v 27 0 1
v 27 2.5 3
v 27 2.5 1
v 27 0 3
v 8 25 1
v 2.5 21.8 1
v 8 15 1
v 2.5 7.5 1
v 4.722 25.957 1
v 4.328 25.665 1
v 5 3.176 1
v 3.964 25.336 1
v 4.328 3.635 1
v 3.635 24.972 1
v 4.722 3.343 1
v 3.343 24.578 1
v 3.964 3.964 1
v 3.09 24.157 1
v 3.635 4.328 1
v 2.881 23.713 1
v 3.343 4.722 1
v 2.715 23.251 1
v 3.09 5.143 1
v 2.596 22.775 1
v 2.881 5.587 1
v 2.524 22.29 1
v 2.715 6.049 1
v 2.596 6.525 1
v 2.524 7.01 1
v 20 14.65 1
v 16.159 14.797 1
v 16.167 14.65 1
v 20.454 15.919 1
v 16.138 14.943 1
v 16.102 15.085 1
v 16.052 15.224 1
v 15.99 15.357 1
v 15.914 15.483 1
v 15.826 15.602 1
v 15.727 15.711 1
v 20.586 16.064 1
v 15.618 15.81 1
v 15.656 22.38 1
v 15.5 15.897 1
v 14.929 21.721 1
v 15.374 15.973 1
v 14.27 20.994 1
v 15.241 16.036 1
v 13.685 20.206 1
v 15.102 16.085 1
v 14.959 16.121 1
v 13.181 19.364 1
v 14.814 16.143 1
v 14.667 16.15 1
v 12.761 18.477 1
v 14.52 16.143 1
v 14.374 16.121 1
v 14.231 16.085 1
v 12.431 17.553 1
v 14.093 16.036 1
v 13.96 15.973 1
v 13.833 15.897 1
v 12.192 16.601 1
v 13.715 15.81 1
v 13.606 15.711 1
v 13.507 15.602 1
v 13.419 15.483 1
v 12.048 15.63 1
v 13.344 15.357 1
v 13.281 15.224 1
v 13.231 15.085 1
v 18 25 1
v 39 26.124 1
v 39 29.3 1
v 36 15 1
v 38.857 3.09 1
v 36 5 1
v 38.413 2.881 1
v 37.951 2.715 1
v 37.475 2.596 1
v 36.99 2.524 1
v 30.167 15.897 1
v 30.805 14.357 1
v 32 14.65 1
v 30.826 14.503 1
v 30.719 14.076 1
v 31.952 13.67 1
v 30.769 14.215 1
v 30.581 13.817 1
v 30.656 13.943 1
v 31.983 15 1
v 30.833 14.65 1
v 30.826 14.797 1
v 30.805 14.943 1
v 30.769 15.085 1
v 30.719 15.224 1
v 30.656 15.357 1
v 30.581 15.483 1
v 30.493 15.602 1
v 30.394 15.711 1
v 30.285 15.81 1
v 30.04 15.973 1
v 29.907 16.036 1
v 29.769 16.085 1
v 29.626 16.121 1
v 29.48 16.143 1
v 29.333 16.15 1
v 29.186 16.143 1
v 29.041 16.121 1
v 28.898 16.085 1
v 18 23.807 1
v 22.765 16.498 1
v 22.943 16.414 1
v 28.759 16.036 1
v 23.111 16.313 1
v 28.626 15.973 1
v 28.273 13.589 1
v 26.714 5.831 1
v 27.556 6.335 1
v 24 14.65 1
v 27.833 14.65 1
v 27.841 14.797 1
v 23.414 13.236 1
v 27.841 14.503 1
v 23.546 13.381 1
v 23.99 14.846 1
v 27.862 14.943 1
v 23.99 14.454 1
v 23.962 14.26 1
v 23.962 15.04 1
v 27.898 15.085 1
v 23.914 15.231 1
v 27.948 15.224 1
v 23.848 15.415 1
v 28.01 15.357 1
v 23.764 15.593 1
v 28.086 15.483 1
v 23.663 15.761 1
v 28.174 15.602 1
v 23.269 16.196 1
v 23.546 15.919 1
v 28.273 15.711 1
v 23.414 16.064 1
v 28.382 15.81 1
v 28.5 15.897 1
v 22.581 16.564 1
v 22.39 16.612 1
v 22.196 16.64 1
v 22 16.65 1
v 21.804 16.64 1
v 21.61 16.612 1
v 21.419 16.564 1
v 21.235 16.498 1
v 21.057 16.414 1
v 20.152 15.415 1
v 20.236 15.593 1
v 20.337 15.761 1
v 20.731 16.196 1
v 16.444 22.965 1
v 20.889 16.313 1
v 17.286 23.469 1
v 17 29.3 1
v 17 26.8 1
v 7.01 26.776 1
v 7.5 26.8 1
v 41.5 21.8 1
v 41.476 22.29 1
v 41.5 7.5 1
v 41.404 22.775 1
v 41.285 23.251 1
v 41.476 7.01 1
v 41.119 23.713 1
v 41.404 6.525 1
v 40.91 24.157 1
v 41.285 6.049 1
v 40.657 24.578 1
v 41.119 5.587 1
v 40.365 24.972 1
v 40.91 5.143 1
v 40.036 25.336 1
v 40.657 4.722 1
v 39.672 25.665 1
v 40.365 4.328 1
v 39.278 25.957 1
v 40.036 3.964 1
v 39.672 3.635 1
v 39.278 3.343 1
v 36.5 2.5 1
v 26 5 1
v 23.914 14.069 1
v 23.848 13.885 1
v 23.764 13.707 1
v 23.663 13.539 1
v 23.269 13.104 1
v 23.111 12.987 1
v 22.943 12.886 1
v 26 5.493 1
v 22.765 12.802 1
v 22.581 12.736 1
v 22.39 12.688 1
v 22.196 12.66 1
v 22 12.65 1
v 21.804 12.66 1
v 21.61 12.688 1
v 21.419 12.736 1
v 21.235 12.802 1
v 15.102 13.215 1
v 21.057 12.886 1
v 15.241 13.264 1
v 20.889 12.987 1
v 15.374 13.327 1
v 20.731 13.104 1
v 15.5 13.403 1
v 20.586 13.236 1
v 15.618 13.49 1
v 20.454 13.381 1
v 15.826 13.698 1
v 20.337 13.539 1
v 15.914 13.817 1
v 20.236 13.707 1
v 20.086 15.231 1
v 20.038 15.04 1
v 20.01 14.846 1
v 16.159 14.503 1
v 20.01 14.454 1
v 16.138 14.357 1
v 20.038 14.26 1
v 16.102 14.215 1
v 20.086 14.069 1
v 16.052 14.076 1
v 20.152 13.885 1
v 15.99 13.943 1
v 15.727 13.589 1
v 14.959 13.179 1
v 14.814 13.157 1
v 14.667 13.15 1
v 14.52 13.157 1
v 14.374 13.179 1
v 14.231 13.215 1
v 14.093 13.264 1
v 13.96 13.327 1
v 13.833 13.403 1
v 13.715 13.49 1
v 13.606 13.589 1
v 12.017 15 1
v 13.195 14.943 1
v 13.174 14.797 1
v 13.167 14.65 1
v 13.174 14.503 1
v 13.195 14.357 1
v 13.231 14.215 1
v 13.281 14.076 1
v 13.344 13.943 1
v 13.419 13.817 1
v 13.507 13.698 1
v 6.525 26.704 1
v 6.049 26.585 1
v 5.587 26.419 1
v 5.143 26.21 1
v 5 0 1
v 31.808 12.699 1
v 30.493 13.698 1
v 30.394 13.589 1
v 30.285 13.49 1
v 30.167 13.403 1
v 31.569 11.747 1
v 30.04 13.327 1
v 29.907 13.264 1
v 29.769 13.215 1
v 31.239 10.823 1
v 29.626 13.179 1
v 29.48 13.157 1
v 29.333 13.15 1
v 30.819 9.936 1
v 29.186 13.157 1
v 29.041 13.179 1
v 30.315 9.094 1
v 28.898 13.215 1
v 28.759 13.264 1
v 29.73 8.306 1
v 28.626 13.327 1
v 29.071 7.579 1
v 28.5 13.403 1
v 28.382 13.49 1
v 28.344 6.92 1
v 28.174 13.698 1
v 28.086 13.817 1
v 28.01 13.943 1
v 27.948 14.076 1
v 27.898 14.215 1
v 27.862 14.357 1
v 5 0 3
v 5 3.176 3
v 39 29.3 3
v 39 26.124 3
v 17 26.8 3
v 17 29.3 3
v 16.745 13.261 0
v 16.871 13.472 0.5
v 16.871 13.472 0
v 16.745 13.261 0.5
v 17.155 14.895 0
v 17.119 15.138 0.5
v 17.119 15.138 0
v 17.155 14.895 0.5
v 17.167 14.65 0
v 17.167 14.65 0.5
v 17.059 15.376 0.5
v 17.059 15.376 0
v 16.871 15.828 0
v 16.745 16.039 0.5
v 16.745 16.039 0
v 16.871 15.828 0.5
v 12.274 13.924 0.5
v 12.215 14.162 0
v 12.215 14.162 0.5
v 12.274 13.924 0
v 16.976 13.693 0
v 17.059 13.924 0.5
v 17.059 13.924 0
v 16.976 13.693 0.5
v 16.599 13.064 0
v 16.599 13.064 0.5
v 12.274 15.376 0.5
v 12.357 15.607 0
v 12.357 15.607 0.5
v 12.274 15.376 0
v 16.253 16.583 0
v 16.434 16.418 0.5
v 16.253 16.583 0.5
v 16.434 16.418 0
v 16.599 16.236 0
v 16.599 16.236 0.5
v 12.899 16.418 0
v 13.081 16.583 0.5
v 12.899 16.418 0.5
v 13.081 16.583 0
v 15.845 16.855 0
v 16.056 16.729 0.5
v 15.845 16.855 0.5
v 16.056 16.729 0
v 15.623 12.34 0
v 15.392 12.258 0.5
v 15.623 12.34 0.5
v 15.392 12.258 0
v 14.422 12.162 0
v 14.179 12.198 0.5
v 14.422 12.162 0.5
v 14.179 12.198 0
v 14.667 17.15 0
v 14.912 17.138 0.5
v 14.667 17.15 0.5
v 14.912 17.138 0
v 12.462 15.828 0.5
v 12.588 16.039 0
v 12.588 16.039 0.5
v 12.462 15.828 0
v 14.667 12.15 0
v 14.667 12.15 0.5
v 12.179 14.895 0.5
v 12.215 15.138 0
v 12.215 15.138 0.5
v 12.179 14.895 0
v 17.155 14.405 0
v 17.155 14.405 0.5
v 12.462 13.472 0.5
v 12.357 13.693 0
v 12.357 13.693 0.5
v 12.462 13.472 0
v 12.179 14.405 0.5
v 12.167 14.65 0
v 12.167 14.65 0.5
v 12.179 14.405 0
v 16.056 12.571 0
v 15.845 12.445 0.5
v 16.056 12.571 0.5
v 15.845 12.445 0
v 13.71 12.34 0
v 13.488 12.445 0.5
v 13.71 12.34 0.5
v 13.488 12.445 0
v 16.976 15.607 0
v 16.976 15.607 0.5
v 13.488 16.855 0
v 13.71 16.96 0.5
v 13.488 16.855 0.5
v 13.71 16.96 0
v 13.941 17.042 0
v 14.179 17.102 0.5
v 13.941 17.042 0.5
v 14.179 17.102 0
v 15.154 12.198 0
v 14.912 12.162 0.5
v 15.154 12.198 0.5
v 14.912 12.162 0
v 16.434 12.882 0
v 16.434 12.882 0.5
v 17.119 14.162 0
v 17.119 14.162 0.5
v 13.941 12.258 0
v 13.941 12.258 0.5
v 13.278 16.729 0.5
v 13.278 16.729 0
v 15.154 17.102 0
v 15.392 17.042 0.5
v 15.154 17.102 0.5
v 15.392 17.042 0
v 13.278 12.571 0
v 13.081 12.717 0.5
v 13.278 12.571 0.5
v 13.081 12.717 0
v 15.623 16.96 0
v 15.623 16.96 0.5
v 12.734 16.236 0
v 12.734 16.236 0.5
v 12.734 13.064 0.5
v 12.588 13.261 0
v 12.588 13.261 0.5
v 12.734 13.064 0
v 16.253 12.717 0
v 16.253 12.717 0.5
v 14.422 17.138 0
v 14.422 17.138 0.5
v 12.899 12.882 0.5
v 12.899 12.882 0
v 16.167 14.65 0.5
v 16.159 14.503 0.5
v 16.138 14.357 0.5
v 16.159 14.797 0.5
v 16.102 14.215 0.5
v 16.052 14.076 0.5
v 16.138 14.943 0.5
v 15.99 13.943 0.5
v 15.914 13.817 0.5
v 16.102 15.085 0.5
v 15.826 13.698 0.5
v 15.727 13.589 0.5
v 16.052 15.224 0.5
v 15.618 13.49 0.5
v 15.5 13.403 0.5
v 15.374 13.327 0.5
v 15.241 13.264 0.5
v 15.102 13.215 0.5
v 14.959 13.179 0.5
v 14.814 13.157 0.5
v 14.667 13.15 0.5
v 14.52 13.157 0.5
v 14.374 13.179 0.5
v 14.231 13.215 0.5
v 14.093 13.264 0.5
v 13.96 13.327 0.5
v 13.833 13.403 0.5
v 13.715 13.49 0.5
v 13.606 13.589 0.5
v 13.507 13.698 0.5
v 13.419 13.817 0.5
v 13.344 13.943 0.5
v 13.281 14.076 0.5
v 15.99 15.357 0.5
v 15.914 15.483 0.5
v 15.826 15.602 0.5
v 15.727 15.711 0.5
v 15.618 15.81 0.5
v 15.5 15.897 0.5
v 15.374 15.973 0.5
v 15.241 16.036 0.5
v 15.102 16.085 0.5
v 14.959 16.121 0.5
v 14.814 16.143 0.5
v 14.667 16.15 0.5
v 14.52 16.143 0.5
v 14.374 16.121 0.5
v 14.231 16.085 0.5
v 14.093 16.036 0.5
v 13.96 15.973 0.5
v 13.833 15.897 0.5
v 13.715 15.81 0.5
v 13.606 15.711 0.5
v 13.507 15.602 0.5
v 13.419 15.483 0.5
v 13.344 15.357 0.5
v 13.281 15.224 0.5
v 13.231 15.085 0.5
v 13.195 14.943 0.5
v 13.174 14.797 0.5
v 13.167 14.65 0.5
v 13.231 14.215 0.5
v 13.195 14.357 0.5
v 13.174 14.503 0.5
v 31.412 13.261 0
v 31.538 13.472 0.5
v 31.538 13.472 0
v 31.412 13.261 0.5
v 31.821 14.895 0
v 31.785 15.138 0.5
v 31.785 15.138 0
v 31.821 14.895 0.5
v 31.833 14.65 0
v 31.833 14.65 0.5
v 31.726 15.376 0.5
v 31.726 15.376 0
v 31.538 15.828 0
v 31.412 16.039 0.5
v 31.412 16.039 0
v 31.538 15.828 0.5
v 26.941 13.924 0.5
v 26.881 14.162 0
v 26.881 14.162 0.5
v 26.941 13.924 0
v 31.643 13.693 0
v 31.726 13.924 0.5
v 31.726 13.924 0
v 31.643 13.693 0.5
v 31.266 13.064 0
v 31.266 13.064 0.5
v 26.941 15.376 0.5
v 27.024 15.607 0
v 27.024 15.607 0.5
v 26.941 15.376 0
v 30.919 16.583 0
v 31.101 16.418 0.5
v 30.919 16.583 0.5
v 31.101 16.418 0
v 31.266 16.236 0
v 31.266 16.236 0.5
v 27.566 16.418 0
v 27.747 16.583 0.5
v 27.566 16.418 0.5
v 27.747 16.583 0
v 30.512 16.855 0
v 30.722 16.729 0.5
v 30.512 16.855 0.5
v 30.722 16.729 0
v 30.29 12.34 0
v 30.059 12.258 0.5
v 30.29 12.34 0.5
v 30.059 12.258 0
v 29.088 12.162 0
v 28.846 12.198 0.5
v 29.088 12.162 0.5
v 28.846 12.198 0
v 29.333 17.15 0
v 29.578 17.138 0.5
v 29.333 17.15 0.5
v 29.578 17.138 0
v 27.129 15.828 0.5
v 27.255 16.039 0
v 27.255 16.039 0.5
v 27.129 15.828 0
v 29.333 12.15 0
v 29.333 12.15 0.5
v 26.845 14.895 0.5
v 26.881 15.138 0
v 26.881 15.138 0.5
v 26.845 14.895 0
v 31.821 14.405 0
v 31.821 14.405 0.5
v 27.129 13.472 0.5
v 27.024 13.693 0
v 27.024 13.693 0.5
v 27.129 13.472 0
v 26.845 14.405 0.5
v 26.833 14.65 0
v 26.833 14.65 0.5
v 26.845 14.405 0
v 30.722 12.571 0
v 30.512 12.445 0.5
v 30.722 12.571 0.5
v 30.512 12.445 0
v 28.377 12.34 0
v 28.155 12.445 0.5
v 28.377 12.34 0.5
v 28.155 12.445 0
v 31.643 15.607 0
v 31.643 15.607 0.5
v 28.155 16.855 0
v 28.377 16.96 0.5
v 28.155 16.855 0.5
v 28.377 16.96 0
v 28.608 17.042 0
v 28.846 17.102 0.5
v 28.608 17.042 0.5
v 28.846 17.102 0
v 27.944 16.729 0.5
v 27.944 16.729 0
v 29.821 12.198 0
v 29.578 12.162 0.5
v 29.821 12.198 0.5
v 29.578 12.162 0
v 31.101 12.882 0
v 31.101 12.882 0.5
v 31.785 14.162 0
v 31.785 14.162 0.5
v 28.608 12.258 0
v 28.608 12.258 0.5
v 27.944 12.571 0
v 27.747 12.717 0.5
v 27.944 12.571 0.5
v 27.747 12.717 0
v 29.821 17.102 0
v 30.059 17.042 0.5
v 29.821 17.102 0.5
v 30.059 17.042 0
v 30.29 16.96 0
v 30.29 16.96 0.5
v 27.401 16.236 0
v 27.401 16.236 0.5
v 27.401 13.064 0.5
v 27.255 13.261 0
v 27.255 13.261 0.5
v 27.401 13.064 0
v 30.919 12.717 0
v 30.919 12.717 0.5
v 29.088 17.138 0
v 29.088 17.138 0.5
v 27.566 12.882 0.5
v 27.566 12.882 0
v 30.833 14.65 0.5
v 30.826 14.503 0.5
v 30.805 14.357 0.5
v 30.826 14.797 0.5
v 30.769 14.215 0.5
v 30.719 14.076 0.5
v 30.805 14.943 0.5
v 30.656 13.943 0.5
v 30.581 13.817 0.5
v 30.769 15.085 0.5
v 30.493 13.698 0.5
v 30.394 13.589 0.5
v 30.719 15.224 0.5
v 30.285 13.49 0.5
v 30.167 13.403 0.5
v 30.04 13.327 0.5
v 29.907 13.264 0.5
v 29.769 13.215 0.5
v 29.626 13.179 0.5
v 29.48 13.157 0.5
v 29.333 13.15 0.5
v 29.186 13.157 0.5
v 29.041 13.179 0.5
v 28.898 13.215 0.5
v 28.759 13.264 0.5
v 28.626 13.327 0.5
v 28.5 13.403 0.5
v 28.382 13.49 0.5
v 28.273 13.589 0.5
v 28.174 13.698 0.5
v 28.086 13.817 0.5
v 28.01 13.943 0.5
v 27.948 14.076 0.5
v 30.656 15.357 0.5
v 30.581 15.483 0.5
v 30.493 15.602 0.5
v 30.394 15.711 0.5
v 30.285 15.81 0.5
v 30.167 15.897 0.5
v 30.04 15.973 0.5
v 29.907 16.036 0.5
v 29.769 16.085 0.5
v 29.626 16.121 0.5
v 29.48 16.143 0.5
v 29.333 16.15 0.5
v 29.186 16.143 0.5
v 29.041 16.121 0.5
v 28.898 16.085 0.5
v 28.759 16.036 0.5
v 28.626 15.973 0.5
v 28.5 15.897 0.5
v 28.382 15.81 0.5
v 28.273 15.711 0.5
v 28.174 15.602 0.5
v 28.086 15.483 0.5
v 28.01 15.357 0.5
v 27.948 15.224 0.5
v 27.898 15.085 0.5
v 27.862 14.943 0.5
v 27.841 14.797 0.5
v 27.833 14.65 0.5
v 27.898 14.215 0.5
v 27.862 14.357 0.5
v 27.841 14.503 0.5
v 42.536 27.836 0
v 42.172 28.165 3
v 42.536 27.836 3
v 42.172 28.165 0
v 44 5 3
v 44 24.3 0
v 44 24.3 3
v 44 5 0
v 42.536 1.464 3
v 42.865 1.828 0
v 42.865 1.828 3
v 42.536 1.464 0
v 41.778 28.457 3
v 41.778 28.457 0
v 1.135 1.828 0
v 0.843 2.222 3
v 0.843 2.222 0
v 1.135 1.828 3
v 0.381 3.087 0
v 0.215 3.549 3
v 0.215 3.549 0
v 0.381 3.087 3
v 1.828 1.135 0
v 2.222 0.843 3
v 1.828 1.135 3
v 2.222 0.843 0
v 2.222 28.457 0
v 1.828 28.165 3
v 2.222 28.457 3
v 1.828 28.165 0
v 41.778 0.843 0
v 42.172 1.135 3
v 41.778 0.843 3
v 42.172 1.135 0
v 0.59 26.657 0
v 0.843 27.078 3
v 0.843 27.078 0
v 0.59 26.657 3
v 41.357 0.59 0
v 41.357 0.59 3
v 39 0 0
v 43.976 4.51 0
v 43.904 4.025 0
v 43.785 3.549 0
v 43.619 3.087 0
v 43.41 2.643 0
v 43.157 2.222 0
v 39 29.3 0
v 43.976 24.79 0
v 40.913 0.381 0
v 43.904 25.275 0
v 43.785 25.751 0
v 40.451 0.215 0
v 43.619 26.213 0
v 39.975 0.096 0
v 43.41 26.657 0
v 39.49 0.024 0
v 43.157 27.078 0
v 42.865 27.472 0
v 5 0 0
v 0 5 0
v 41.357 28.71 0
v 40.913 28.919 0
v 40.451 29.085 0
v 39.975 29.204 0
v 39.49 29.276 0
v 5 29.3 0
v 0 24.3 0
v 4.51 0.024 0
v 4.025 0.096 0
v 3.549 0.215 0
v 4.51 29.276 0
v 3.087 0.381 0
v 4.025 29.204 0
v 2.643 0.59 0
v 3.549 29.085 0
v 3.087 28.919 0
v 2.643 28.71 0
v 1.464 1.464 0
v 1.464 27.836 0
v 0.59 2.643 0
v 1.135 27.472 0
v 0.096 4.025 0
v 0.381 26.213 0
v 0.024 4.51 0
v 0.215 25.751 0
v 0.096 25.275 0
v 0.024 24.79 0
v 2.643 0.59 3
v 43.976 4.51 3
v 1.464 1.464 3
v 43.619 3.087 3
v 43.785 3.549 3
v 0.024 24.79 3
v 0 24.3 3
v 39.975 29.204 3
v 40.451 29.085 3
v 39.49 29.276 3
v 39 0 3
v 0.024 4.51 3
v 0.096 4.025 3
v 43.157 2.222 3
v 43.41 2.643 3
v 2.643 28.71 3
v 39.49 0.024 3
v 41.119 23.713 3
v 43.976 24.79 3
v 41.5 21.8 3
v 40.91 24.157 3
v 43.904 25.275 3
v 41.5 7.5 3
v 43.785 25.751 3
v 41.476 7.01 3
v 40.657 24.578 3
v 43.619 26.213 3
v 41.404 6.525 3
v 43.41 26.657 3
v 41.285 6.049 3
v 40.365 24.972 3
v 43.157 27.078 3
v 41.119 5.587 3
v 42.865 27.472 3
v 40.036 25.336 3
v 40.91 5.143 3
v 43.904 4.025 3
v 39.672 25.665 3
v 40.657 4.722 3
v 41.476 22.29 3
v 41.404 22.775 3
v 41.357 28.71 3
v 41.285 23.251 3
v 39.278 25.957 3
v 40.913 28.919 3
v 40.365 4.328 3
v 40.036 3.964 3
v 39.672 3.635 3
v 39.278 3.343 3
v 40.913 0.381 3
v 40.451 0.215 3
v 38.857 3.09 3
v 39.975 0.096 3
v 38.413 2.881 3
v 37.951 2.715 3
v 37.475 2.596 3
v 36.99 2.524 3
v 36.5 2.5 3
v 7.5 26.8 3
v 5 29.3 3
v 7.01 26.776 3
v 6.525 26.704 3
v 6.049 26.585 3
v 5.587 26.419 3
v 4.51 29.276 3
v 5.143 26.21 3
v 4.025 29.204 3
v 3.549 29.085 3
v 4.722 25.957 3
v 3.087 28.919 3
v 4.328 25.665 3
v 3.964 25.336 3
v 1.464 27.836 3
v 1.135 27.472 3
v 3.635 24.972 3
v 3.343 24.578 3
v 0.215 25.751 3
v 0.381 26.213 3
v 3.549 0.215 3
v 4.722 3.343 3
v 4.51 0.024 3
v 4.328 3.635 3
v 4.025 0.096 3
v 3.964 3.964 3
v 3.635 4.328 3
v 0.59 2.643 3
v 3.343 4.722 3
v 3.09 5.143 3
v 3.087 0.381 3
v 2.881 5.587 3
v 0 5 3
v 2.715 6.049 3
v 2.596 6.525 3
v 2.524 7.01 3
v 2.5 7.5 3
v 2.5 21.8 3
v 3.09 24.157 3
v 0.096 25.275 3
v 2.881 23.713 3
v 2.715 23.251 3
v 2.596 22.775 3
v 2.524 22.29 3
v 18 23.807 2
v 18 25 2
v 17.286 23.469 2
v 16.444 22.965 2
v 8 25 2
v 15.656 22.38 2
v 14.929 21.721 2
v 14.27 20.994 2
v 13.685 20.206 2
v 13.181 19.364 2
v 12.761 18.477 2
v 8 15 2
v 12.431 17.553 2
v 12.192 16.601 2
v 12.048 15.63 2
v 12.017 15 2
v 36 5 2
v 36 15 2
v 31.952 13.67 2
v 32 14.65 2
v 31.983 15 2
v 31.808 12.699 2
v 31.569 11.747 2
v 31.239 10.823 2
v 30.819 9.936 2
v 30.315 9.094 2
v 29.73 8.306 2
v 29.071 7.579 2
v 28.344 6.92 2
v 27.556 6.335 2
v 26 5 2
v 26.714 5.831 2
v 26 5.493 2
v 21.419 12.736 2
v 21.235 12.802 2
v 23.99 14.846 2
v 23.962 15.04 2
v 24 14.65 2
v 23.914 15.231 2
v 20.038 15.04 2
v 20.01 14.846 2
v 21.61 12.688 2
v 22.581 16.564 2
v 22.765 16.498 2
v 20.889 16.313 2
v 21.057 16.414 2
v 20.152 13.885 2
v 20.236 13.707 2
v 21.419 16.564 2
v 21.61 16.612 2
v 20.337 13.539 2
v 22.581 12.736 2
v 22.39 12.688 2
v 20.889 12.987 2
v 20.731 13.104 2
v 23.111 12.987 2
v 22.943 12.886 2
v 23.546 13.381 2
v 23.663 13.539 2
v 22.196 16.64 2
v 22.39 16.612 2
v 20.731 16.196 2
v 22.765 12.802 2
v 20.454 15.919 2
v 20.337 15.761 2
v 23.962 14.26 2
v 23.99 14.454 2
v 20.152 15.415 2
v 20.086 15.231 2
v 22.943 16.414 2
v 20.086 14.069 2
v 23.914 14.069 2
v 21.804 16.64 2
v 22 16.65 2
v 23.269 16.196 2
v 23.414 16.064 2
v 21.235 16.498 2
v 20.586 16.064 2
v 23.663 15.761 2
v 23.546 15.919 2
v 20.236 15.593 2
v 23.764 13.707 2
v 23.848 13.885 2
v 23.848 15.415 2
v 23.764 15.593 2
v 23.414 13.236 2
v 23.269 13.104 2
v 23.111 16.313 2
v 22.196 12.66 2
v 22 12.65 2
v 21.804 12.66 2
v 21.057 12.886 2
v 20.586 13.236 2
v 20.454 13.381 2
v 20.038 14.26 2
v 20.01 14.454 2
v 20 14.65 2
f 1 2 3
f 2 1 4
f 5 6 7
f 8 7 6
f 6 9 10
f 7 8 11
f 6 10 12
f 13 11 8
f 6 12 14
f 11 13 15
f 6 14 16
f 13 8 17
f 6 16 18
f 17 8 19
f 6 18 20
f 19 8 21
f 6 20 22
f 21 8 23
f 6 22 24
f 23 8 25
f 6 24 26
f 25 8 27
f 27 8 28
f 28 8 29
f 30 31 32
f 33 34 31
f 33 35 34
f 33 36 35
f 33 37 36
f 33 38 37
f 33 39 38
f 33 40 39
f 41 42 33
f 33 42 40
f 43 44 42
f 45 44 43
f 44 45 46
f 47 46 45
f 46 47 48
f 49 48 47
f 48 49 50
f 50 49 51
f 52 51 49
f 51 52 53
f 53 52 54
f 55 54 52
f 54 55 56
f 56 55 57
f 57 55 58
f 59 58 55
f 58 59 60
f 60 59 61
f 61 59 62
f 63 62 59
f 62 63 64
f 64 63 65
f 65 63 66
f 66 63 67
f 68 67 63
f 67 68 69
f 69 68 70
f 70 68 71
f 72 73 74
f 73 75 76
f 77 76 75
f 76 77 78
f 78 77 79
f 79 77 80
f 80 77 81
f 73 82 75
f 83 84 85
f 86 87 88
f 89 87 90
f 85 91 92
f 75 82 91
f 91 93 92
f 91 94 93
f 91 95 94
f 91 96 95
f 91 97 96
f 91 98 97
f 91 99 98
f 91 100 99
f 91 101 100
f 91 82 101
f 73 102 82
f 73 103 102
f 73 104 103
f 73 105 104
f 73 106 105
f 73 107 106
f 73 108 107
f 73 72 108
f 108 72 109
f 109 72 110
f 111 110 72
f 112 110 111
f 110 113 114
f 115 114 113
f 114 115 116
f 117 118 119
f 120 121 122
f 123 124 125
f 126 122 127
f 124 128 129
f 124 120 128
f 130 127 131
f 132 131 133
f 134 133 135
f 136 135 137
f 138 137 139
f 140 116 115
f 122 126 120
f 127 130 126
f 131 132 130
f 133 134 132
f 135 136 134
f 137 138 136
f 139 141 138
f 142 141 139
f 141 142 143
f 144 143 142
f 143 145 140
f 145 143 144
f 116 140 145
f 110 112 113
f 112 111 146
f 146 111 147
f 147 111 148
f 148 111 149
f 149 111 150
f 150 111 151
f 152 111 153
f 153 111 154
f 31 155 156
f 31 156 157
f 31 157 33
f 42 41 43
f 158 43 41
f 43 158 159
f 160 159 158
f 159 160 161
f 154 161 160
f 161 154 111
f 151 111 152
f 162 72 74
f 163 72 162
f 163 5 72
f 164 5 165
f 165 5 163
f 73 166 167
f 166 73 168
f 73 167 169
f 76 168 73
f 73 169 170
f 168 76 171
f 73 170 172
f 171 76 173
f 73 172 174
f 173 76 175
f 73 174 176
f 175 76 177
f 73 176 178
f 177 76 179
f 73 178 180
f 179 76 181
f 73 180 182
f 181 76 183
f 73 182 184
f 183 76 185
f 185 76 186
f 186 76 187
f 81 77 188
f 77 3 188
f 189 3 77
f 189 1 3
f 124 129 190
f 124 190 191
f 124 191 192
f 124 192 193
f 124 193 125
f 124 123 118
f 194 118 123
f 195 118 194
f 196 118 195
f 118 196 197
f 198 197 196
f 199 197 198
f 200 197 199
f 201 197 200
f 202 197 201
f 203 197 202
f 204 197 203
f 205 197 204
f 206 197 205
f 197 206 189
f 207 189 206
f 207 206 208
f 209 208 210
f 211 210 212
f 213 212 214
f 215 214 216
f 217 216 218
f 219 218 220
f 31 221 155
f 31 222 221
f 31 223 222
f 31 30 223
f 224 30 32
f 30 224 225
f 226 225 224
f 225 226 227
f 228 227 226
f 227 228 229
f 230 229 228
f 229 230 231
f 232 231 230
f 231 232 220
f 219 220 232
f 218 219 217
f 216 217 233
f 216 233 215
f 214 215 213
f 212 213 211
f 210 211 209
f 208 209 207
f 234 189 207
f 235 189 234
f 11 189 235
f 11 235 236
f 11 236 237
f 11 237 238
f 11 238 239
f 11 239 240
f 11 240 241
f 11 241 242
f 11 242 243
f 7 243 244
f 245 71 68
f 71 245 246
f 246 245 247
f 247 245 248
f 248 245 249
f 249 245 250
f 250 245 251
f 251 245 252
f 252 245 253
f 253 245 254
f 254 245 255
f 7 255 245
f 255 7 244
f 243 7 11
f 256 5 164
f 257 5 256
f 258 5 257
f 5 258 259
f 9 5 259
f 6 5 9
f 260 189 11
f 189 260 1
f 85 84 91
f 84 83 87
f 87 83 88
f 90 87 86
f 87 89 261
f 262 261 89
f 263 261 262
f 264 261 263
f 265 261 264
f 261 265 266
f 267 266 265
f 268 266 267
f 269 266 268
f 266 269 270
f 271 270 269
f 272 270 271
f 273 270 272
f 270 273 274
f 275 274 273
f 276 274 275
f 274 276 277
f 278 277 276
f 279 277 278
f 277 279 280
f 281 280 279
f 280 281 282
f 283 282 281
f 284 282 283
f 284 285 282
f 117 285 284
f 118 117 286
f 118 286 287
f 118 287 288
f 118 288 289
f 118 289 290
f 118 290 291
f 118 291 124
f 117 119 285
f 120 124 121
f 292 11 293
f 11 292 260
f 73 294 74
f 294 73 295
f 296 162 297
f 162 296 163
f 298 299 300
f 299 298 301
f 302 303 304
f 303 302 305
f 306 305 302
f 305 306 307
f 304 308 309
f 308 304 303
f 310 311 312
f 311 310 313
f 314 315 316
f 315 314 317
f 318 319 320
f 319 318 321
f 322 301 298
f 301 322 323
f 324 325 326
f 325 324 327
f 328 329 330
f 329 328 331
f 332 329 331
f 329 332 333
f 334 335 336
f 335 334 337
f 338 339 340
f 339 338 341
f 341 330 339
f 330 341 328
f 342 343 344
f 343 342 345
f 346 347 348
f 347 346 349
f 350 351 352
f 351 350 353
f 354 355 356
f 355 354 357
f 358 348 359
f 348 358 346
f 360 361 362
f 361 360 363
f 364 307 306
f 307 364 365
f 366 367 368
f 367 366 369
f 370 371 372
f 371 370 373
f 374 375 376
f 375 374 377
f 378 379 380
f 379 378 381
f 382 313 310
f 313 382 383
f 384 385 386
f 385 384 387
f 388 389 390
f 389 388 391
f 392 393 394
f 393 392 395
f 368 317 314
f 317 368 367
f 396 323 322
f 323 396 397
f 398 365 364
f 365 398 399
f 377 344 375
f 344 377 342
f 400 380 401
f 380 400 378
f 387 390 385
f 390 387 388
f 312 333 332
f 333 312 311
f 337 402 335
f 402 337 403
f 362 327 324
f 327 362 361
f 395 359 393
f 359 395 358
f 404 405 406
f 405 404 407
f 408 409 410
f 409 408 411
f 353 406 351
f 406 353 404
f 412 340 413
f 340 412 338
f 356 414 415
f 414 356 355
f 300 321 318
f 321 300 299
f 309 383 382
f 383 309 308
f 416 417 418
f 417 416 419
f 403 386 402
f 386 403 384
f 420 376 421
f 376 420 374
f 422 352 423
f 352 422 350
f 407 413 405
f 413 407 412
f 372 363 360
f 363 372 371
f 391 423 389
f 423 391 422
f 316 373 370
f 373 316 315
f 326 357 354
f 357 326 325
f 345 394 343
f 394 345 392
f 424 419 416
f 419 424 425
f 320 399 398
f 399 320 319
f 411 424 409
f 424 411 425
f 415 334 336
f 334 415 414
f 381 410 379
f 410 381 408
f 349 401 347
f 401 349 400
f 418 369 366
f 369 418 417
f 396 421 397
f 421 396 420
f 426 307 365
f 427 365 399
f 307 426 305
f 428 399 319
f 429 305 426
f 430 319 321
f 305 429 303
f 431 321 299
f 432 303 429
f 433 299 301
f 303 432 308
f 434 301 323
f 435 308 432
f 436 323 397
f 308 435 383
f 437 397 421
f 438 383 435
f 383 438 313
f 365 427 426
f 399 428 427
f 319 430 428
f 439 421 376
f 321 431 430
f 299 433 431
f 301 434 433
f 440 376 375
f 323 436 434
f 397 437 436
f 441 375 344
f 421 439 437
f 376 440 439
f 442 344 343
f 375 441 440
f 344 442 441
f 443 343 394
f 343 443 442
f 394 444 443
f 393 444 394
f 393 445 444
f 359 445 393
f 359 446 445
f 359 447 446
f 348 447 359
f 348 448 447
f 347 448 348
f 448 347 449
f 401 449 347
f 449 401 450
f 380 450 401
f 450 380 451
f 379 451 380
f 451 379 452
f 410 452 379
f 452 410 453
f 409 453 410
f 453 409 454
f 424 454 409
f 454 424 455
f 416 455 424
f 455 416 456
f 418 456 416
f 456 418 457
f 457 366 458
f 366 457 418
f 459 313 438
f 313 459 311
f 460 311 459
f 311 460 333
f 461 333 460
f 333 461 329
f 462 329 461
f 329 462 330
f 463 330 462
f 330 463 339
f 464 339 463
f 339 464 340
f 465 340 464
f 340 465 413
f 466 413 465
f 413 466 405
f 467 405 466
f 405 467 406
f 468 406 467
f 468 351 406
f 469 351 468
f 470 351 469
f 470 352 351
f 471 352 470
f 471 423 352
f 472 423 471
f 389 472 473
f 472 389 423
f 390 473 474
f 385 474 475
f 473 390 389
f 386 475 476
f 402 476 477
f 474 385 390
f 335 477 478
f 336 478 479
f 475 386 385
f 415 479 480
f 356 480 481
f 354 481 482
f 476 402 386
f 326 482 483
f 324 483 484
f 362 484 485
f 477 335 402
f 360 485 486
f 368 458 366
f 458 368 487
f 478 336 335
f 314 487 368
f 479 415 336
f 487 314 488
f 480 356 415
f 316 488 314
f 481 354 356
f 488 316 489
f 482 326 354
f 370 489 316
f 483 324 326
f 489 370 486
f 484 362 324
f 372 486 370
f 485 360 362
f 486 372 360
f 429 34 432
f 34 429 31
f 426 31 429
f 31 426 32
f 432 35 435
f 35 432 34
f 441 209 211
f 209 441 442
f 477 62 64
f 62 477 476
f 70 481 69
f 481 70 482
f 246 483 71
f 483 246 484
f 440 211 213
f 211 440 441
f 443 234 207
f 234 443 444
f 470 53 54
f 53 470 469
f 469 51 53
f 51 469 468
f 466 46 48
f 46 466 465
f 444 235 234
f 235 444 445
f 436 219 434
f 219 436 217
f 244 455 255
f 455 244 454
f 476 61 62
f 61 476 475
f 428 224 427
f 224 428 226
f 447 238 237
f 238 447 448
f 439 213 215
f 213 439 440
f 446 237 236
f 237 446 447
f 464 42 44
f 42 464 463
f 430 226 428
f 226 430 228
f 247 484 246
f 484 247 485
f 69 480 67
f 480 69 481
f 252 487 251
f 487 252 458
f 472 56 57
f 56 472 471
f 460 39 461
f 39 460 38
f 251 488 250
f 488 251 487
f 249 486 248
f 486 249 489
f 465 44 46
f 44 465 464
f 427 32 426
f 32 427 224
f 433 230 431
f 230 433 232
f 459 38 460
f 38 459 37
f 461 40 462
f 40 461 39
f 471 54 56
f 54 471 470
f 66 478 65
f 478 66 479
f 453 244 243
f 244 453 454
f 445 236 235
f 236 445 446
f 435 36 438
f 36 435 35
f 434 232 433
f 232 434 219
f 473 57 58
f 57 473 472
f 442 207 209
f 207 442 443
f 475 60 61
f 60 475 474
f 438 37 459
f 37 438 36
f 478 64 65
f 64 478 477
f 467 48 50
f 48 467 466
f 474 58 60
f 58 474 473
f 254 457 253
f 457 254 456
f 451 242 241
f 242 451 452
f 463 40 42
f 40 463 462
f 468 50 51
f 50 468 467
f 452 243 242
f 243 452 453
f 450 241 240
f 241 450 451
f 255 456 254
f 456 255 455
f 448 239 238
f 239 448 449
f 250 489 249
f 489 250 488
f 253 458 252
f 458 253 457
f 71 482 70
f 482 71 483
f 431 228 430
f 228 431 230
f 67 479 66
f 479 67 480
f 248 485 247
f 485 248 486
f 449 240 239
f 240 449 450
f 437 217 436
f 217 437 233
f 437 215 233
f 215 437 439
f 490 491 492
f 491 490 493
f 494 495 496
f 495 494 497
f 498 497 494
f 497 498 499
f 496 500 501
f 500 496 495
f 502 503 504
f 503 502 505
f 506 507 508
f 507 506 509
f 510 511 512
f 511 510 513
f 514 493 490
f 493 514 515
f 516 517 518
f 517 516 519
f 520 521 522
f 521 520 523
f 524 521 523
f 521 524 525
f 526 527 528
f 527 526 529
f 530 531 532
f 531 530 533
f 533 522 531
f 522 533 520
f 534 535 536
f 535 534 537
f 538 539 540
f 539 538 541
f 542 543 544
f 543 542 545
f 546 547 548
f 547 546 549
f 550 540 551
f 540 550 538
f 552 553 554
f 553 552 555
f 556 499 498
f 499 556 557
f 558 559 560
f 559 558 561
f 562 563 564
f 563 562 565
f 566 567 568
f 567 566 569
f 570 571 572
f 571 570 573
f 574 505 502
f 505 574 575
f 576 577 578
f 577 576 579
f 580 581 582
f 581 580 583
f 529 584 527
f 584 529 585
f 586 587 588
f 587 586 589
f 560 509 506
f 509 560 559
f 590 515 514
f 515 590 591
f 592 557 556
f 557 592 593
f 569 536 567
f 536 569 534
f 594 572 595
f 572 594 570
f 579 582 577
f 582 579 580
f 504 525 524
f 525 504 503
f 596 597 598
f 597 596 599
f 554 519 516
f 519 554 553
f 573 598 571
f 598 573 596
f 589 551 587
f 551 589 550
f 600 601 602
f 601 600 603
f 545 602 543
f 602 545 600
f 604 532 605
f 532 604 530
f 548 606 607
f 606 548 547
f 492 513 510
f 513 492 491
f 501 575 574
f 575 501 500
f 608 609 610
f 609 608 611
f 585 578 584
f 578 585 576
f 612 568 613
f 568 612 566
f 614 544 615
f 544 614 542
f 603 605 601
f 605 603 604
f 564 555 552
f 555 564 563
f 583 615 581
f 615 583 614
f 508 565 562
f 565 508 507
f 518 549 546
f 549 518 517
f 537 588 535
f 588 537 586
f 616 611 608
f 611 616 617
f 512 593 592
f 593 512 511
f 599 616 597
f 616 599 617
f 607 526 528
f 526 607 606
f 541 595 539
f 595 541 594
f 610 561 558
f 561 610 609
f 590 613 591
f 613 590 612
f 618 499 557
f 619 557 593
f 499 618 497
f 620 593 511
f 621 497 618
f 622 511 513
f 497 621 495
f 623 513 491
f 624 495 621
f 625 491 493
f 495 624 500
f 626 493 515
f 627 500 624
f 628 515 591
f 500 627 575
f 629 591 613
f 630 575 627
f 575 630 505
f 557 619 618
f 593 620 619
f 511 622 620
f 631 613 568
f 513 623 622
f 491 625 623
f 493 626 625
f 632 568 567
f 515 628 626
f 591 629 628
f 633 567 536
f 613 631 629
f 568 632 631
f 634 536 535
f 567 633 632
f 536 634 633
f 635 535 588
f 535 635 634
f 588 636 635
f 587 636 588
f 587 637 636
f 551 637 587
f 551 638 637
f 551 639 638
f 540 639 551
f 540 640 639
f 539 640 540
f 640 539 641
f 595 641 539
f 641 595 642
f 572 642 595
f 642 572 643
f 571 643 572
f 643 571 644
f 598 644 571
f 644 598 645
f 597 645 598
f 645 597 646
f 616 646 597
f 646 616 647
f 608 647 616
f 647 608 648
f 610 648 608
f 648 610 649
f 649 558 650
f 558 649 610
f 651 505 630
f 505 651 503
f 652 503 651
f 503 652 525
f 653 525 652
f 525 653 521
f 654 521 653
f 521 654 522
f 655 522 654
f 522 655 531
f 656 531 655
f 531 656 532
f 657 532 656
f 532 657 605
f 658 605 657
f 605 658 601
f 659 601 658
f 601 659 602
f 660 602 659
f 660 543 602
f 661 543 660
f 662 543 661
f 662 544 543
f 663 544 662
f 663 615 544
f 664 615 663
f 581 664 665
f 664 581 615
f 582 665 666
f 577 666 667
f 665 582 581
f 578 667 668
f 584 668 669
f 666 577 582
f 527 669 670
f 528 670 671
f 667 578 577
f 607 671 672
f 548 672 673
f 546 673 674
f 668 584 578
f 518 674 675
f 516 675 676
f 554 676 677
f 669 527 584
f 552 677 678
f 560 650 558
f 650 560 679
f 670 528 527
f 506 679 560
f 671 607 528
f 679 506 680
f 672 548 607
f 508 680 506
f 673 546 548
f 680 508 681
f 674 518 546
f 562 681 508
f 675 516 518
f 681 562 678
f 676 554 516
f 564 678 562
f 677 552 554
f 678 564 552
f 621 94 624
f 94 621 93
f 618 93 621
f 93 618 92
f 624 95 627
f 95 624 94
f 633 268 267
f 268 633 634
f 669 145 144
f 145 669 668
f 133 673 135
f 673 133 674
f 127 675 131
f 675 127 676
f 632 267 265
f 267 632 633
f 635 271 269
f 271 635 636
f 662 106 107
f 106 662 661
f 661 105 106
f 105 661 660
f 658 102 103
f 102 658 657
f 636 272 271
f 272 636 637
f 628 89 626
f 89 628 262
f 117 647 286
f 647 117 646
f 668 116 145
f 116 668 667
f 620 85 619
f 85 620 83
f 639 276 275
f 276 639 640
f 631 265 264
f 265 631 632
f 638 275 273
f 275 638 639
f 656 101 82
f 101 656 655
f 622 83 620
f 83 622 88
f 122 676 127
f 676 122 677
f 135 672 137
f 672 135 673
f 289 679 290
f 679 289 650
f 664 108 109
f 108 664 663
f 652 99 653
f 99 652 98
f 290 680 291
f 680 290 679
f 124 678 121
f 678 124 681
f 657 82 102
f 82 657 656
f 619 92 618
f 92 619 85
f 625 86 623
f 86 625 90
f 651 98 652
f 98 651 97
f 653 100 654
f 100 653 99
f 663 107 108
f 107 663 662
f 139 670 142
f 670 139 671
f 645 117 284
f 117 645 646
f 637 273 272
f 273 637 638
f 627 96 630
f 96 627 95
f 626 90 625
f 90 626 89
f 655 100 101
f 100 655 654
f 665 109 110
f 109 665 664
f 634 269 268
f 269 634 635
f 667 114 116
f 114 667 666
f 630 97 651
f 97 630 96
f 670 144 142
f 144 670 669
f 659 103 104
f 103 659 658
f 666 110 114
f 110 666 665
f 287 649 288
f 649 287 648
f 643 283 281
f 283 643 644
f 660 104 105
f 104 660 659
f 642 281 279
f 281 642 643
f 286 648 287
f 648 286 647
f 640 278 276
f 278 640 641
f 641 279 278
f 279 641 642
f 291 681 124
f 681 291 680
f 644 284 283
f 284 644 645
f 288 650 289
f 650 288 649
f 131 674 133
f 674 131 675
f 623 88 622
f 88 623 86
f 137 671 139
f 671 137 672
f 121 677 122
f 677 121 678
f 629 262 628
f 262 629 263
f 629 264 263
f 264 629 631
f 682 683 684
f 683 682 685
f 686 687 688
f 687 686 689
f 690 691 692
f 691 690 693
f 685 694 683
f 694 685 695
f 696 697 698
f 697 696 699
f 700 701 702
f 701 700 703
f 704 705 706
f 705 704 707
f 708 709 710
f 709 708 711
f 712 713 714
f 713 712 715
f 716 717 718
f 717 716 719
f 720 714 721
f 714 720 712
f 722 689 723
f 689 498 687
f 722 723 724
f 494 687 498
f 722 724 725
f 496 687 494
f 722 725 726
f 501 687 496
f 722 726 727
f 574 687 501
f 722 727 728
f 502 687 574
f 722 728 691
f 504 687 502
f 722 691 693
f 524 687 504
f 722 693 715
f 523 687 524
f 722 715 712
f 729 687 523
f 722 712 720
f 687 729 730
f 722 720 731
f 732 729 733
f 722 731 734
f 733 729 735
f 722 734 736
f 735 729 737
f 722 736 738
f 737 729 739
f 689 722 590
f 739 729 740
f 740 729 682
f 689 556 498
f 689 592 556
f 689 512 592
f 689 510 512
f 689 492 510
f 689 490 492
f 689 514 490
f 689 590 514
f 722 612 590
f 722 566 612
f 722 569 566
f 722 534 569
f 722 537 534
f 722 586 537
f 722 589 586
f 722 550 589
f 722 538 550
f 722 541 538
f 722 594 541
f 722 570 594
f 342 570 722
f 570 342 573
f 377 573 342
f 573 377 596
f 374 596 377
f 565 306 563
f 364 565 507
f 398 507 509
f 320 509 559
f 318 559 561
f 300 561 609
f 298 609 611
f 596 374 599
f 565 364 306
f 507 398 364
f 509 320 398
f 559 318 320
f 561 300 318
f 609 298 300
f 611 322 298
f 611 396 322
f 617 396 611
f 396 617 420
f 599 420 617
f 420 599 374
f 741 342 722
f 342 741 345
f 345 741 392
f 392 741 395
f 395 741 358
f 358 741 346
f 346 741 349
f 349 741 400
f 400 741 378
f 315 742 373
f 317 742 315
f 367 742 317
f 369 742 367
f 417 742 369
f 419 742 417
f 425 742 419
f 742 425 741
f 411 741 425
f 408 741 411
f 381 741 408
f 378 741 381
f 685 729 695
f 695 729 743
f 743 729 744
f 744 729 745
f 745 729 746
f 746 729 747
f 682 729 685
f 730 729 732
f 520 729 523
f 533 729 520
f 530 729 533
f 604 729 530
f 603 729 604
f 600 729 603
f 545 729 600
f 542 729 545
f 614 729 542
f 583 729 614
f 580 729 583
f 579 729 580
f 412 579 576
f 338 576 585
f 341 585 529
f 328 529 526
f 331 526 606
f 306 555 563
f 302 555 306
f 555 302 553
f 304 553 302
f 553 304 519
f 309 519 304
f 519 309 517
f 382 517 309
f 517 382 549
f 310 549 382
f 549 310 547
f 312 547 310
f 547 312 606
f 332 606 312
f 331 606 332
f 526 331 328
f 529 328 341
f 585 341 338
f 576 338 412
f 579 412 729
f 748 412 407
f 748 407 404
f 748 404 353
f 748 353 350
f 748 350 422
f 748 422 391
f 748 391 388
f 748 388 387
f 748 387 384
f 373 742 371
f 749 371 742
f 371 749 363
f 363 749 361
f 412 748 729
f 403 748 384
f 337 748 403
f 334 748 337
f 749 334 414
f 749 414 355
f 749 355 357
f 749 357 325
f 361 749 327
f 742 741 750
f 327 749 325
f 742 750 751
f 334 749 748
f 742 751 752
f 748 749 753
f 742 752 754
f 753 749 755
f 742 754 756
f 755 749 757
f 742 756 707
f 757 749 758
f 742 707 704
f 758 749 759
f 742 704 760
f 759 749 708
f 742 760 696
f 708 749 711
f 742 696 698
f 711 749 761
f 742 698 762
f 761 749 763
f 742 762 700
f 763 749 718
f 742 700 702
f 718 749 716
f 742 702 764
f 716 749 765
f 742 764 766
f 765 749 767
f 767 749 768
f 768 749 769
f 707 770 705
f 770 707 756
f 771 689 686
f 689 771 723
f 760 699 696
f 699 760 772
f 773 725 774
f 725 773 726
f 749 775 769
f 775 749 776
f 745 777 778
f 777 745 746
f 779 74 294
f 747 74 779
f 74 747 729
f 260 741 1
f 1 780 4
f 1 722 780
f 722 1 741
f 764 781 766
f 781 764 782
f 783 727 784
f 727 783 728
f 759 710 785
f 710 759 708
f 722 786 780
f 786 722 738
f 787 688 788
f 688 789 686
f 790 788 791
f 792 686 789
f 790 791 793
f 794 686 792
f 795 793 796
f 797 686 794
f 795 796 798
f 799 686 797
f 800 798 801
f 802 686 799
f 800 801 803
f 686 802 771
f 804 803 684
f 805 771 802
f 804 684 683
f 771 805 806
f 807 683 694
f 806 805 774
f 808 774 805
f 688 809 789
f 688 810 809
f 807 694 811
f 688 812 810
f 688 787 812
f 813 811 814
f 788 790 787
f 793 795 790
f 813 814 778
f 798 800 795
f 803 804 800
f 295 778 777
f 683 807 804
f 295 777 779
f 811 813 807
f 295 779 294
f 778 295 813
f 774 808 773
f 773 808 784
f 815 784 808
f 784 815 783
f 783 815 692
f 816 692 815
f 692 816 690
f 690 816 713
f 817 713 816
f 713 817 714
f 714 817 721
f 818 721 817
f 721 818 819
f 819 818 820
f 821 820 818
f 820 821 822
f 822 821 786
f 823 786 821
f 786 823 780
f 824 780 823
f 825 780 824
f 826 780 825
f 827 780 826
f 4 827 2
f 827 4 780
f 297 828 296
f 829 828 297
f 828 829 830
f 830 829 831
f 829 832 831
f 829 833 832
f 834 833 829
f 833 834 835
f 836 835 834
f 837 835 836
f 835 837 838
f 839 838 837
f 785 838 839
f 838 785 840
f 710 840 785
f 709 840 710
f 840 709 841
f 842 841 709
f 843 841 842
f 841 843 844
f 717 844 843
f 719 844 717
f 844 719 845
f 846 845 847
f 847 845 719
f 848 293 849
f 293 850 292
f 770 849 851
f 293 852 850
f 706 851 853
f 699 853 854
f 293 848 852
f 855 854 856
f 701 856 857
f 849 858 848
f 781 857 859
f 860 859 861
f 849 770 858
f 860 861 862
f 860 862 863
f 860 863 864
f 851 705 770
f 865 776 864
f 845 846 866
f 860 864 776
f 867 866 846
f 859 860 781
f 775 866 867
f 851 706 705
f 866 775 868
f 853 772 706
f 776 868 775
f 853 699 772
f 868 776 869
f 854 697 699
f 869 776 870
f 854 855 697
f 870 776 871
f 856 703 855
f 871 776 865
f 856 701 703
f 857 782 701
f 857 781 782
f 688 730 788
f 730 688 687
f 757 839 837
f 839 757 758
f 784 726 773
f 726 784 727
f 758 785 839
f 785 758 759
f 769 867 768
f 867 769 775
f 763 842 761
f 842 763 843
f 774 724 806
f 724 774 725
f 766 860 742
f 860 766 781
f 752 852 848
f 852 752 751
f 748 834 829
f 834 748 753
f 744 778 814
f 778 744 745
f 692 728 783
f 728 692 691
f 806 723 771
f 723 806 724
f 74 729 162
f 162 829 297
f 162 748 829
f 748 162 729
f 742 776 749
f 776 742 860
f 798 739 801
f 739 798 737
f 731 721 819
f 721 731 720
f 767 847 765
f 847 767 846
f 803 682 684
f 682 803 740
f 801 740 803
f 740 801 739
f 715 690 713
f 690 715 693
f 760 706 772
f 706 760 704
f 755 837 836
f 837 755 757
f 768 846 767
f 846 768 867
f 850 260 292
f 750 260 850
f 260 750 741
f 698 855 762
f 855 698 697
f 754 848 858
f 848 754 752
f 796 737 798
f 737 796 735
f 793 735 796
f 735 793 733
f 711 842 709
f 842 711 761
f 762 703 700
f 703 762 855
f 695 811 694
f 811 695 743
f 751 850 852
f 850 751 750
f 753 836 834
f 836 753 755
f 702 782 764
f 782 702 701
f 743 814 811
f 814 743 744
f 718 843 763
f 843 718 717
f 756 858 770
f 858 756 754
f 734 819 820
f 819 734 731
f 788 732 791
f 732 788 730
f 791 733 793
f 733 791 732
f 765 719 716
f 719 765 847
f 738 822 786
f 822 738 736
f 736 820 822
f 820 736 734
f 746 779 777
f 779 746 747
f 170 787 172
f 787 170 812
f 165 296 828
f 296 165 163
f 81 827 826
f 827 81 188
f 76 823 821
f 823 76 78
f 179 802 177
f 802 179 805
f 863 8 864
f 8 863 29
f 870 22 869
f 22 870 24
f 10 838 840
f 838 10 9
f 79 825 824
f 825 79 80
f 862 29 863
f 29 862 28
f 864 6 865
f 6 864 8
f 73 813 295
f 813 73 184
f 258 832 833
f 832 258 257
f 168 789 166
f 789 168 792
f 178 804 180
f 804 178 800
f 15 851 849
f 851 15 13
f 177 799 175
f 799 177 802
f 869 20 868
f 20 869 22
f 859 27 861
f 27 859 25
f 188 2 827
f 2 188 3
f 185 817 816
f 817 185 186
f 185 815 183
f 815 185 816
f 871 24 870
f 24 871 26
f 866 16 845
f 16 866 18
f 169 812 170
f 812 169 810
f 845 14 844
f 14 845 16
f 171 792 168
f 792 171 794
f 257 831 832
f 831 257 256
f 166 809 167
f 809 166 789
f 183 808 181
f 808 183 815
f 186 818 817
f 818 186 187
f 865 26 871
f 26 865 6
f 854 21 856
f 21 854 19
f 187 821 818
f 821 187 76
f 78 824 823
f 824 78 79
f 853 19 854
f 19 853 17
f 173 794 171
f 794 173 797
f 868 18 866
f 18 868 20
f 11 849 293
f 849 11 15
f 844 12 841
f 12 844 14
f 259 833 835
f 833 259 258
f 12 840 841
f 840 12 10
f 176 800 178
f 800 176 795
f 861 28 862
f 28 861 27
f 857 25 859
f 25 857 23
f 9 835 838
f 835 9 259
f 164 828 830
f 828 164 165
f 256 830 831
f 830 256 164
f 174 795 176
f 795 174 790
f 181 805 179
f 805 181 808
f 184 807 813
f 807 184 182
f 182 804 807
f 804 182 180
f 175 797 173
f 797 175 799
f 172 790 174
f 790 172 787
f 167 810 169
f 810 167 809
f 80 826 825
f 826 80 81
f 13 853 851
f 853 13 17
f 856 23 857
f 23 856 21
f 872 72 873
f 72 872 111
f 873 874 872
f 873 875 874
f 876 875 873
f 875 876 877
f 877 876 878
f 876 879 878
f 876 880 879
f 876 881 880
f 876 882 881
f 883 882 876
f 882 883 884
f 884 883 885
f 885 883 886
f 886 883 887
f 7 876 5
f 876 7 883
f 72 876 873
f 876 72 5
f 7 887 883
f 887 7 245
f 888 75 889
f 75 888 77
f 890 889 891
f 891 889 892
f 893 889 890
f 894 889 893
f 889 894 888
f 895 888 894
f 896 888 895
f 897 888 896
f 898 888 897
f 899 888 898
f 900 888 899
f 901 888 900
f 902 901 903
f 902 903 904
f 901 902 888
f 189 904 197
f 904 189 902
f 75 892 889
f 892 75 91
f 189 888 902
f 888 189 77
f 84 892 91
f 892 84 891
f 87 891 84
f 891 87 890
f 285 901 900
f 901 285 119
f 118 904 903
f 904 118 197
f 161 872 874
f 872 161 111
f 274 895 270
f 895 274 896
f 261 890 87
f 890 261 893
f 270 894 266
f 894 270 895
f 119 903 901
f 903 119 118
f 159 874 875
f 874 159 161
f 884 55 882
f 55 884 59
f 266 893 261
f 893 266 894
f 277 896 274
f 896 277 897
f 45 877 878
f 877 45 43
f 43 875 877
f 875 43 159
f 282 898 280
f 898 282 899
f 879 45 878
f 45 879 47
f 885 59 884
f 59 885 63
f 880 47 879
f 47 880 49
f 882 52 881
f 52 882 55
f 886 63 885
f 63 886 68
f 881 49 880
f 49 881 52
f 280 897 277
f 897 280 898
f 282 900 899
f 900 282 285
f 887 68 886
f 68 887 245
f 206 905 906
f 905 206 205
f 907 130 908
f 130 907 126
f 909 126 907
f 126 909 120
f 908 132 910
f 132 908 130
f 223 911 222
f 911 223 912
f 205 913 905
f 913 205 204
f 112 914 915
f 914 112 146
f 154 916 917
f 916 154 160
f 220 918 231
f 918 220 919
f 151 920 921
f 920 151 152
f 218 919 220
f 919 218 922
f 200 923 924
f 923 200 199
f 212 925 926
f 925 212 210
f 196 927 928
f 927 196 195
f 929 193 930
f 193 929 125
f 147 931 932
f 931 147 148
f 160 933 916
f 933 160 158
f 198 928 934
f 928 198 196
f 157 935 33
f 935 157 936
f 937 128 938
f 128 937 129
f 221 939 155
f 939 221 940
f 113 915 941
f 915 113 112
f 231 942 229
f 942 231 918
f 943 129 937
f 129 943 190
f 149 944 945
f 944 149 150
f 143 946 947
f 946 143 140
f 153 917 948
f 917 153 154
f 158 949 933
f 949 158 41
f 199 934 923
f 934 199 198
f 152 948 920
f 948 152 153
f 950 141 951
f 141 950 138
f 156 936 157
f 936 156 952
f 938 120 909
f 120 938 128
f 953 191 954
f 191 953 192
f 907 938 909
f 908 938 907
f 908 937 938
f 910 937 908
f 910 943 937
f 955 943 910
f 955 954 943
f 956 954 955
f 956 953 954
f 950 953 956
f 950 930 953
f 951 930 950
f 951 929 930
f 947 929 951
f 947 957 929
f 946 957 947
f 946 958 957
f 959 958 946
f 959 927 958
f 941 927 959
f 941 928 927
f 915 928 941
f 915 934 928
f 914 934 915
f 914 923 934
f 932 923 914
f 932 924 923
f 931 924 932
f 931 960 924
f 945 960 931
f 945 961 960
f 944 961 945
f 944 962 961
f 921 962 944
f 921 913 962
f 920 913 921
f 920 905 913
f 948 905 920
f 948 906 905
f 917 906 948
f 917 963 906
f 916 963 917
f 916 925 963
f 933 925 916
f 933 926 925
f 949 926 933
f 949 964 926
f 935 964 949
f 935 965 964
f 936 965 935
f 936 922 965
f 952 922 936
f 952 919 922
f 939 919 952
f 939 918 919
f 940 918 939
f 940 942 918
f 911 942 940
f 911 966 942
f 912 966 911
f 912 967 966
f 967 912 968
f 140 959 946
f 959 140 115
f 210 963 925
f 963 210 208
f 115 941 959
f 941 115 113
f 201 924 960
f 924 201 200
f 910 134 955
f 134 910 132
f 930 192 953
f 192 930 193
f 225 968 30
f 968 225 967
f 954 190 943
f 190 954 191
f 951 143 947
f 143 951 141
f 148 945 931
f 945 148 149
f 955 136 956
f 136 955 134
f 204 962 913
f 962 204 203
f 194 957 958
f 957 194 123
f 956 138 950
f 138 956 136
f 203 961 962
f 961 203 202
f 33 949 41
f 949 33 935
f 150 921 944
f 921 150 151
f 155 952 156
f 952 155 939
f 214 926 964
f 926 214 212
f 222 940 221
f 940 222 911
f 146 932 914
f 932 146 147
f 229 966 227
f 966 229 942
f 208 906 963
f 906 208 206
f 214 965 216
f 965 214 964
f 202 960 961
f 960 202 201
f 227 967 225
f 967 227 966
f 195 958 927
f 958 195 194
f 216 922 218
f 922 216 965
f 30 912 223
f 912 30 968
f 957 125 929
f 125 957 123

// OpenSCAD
$fn=64;
corner_radius=5;
height=3;
plate_height=1;
plate_length=44;
plate_width=29.3;
wall_thickness=5;

pillar_radius=2;
pillar_hole_radius=1.5;
pillar_mount_radius=2.5;
pillar_mount_height=0.5;

rotator_mount_diameter=20;
rotator_mount_thickness=1;
rotator_mount_height=1;

translate([corner_radius,corner_radius,0]) difference() {
    minkowski() {
        cube([plate_length-2 * corner_radius, plate_width-2 * corner_radius, height/2]);
        cylinder(r=corner_radius, h=height/2);
    }
    minkowski() {
        translate([corner_radius/2,corner_radius/2,plate_height]) cube([plate_length-2 * corner_radius - wall_thickness, plate_width-2 * corner_radius - wall_thickness, height/2]);
        cylinder(r=corner_radius, h=height/2);
    }
    //side entrance
    translate([-corner_radius,-corner_radius,0]) union() {
        translate([5,-1,plate_height]) cube([plate_length/2,10,height]);
        translate([plate_length/2-5,plate_width+1-10,plate_height]) cube([plate_length/2,10,height]);
    }
    translate([-corner_radius,-corner_radius,0]) union() {
        pillar_hole(plate_length/3);
        pillar_hole(plate_length*2/3);
    }
}

//rotator_mount
translate([plate_length/2,plate_width/2,plate_height])  cylinder(d=4, h=rotator_mount_height);

difference() {
    union() {
        translate([8,15,plate_height]) cube([10,10,rotator_mount_height]);
        translate([26,5,plate_height]) cube([10,10,rotator_mount_height]);
    }
    translate([plate_length/2,plate_width/2,plate_height-1]) cylinder(d=rotator_mount_diameter, h=rotator_mount_height+2);
}

module pillar_hole(x) {
    translate([x, plate_width/2, 0]) {
        translate([0,0,-1]) cylinder(h=pillar_mount_height+1, r=pillar_mount_radius);
        translate([0,0,-1]) cylinder(h=10, r=pillar_hole_radius);
    }
}



// add screw holders
// add centre rotation cylinder
